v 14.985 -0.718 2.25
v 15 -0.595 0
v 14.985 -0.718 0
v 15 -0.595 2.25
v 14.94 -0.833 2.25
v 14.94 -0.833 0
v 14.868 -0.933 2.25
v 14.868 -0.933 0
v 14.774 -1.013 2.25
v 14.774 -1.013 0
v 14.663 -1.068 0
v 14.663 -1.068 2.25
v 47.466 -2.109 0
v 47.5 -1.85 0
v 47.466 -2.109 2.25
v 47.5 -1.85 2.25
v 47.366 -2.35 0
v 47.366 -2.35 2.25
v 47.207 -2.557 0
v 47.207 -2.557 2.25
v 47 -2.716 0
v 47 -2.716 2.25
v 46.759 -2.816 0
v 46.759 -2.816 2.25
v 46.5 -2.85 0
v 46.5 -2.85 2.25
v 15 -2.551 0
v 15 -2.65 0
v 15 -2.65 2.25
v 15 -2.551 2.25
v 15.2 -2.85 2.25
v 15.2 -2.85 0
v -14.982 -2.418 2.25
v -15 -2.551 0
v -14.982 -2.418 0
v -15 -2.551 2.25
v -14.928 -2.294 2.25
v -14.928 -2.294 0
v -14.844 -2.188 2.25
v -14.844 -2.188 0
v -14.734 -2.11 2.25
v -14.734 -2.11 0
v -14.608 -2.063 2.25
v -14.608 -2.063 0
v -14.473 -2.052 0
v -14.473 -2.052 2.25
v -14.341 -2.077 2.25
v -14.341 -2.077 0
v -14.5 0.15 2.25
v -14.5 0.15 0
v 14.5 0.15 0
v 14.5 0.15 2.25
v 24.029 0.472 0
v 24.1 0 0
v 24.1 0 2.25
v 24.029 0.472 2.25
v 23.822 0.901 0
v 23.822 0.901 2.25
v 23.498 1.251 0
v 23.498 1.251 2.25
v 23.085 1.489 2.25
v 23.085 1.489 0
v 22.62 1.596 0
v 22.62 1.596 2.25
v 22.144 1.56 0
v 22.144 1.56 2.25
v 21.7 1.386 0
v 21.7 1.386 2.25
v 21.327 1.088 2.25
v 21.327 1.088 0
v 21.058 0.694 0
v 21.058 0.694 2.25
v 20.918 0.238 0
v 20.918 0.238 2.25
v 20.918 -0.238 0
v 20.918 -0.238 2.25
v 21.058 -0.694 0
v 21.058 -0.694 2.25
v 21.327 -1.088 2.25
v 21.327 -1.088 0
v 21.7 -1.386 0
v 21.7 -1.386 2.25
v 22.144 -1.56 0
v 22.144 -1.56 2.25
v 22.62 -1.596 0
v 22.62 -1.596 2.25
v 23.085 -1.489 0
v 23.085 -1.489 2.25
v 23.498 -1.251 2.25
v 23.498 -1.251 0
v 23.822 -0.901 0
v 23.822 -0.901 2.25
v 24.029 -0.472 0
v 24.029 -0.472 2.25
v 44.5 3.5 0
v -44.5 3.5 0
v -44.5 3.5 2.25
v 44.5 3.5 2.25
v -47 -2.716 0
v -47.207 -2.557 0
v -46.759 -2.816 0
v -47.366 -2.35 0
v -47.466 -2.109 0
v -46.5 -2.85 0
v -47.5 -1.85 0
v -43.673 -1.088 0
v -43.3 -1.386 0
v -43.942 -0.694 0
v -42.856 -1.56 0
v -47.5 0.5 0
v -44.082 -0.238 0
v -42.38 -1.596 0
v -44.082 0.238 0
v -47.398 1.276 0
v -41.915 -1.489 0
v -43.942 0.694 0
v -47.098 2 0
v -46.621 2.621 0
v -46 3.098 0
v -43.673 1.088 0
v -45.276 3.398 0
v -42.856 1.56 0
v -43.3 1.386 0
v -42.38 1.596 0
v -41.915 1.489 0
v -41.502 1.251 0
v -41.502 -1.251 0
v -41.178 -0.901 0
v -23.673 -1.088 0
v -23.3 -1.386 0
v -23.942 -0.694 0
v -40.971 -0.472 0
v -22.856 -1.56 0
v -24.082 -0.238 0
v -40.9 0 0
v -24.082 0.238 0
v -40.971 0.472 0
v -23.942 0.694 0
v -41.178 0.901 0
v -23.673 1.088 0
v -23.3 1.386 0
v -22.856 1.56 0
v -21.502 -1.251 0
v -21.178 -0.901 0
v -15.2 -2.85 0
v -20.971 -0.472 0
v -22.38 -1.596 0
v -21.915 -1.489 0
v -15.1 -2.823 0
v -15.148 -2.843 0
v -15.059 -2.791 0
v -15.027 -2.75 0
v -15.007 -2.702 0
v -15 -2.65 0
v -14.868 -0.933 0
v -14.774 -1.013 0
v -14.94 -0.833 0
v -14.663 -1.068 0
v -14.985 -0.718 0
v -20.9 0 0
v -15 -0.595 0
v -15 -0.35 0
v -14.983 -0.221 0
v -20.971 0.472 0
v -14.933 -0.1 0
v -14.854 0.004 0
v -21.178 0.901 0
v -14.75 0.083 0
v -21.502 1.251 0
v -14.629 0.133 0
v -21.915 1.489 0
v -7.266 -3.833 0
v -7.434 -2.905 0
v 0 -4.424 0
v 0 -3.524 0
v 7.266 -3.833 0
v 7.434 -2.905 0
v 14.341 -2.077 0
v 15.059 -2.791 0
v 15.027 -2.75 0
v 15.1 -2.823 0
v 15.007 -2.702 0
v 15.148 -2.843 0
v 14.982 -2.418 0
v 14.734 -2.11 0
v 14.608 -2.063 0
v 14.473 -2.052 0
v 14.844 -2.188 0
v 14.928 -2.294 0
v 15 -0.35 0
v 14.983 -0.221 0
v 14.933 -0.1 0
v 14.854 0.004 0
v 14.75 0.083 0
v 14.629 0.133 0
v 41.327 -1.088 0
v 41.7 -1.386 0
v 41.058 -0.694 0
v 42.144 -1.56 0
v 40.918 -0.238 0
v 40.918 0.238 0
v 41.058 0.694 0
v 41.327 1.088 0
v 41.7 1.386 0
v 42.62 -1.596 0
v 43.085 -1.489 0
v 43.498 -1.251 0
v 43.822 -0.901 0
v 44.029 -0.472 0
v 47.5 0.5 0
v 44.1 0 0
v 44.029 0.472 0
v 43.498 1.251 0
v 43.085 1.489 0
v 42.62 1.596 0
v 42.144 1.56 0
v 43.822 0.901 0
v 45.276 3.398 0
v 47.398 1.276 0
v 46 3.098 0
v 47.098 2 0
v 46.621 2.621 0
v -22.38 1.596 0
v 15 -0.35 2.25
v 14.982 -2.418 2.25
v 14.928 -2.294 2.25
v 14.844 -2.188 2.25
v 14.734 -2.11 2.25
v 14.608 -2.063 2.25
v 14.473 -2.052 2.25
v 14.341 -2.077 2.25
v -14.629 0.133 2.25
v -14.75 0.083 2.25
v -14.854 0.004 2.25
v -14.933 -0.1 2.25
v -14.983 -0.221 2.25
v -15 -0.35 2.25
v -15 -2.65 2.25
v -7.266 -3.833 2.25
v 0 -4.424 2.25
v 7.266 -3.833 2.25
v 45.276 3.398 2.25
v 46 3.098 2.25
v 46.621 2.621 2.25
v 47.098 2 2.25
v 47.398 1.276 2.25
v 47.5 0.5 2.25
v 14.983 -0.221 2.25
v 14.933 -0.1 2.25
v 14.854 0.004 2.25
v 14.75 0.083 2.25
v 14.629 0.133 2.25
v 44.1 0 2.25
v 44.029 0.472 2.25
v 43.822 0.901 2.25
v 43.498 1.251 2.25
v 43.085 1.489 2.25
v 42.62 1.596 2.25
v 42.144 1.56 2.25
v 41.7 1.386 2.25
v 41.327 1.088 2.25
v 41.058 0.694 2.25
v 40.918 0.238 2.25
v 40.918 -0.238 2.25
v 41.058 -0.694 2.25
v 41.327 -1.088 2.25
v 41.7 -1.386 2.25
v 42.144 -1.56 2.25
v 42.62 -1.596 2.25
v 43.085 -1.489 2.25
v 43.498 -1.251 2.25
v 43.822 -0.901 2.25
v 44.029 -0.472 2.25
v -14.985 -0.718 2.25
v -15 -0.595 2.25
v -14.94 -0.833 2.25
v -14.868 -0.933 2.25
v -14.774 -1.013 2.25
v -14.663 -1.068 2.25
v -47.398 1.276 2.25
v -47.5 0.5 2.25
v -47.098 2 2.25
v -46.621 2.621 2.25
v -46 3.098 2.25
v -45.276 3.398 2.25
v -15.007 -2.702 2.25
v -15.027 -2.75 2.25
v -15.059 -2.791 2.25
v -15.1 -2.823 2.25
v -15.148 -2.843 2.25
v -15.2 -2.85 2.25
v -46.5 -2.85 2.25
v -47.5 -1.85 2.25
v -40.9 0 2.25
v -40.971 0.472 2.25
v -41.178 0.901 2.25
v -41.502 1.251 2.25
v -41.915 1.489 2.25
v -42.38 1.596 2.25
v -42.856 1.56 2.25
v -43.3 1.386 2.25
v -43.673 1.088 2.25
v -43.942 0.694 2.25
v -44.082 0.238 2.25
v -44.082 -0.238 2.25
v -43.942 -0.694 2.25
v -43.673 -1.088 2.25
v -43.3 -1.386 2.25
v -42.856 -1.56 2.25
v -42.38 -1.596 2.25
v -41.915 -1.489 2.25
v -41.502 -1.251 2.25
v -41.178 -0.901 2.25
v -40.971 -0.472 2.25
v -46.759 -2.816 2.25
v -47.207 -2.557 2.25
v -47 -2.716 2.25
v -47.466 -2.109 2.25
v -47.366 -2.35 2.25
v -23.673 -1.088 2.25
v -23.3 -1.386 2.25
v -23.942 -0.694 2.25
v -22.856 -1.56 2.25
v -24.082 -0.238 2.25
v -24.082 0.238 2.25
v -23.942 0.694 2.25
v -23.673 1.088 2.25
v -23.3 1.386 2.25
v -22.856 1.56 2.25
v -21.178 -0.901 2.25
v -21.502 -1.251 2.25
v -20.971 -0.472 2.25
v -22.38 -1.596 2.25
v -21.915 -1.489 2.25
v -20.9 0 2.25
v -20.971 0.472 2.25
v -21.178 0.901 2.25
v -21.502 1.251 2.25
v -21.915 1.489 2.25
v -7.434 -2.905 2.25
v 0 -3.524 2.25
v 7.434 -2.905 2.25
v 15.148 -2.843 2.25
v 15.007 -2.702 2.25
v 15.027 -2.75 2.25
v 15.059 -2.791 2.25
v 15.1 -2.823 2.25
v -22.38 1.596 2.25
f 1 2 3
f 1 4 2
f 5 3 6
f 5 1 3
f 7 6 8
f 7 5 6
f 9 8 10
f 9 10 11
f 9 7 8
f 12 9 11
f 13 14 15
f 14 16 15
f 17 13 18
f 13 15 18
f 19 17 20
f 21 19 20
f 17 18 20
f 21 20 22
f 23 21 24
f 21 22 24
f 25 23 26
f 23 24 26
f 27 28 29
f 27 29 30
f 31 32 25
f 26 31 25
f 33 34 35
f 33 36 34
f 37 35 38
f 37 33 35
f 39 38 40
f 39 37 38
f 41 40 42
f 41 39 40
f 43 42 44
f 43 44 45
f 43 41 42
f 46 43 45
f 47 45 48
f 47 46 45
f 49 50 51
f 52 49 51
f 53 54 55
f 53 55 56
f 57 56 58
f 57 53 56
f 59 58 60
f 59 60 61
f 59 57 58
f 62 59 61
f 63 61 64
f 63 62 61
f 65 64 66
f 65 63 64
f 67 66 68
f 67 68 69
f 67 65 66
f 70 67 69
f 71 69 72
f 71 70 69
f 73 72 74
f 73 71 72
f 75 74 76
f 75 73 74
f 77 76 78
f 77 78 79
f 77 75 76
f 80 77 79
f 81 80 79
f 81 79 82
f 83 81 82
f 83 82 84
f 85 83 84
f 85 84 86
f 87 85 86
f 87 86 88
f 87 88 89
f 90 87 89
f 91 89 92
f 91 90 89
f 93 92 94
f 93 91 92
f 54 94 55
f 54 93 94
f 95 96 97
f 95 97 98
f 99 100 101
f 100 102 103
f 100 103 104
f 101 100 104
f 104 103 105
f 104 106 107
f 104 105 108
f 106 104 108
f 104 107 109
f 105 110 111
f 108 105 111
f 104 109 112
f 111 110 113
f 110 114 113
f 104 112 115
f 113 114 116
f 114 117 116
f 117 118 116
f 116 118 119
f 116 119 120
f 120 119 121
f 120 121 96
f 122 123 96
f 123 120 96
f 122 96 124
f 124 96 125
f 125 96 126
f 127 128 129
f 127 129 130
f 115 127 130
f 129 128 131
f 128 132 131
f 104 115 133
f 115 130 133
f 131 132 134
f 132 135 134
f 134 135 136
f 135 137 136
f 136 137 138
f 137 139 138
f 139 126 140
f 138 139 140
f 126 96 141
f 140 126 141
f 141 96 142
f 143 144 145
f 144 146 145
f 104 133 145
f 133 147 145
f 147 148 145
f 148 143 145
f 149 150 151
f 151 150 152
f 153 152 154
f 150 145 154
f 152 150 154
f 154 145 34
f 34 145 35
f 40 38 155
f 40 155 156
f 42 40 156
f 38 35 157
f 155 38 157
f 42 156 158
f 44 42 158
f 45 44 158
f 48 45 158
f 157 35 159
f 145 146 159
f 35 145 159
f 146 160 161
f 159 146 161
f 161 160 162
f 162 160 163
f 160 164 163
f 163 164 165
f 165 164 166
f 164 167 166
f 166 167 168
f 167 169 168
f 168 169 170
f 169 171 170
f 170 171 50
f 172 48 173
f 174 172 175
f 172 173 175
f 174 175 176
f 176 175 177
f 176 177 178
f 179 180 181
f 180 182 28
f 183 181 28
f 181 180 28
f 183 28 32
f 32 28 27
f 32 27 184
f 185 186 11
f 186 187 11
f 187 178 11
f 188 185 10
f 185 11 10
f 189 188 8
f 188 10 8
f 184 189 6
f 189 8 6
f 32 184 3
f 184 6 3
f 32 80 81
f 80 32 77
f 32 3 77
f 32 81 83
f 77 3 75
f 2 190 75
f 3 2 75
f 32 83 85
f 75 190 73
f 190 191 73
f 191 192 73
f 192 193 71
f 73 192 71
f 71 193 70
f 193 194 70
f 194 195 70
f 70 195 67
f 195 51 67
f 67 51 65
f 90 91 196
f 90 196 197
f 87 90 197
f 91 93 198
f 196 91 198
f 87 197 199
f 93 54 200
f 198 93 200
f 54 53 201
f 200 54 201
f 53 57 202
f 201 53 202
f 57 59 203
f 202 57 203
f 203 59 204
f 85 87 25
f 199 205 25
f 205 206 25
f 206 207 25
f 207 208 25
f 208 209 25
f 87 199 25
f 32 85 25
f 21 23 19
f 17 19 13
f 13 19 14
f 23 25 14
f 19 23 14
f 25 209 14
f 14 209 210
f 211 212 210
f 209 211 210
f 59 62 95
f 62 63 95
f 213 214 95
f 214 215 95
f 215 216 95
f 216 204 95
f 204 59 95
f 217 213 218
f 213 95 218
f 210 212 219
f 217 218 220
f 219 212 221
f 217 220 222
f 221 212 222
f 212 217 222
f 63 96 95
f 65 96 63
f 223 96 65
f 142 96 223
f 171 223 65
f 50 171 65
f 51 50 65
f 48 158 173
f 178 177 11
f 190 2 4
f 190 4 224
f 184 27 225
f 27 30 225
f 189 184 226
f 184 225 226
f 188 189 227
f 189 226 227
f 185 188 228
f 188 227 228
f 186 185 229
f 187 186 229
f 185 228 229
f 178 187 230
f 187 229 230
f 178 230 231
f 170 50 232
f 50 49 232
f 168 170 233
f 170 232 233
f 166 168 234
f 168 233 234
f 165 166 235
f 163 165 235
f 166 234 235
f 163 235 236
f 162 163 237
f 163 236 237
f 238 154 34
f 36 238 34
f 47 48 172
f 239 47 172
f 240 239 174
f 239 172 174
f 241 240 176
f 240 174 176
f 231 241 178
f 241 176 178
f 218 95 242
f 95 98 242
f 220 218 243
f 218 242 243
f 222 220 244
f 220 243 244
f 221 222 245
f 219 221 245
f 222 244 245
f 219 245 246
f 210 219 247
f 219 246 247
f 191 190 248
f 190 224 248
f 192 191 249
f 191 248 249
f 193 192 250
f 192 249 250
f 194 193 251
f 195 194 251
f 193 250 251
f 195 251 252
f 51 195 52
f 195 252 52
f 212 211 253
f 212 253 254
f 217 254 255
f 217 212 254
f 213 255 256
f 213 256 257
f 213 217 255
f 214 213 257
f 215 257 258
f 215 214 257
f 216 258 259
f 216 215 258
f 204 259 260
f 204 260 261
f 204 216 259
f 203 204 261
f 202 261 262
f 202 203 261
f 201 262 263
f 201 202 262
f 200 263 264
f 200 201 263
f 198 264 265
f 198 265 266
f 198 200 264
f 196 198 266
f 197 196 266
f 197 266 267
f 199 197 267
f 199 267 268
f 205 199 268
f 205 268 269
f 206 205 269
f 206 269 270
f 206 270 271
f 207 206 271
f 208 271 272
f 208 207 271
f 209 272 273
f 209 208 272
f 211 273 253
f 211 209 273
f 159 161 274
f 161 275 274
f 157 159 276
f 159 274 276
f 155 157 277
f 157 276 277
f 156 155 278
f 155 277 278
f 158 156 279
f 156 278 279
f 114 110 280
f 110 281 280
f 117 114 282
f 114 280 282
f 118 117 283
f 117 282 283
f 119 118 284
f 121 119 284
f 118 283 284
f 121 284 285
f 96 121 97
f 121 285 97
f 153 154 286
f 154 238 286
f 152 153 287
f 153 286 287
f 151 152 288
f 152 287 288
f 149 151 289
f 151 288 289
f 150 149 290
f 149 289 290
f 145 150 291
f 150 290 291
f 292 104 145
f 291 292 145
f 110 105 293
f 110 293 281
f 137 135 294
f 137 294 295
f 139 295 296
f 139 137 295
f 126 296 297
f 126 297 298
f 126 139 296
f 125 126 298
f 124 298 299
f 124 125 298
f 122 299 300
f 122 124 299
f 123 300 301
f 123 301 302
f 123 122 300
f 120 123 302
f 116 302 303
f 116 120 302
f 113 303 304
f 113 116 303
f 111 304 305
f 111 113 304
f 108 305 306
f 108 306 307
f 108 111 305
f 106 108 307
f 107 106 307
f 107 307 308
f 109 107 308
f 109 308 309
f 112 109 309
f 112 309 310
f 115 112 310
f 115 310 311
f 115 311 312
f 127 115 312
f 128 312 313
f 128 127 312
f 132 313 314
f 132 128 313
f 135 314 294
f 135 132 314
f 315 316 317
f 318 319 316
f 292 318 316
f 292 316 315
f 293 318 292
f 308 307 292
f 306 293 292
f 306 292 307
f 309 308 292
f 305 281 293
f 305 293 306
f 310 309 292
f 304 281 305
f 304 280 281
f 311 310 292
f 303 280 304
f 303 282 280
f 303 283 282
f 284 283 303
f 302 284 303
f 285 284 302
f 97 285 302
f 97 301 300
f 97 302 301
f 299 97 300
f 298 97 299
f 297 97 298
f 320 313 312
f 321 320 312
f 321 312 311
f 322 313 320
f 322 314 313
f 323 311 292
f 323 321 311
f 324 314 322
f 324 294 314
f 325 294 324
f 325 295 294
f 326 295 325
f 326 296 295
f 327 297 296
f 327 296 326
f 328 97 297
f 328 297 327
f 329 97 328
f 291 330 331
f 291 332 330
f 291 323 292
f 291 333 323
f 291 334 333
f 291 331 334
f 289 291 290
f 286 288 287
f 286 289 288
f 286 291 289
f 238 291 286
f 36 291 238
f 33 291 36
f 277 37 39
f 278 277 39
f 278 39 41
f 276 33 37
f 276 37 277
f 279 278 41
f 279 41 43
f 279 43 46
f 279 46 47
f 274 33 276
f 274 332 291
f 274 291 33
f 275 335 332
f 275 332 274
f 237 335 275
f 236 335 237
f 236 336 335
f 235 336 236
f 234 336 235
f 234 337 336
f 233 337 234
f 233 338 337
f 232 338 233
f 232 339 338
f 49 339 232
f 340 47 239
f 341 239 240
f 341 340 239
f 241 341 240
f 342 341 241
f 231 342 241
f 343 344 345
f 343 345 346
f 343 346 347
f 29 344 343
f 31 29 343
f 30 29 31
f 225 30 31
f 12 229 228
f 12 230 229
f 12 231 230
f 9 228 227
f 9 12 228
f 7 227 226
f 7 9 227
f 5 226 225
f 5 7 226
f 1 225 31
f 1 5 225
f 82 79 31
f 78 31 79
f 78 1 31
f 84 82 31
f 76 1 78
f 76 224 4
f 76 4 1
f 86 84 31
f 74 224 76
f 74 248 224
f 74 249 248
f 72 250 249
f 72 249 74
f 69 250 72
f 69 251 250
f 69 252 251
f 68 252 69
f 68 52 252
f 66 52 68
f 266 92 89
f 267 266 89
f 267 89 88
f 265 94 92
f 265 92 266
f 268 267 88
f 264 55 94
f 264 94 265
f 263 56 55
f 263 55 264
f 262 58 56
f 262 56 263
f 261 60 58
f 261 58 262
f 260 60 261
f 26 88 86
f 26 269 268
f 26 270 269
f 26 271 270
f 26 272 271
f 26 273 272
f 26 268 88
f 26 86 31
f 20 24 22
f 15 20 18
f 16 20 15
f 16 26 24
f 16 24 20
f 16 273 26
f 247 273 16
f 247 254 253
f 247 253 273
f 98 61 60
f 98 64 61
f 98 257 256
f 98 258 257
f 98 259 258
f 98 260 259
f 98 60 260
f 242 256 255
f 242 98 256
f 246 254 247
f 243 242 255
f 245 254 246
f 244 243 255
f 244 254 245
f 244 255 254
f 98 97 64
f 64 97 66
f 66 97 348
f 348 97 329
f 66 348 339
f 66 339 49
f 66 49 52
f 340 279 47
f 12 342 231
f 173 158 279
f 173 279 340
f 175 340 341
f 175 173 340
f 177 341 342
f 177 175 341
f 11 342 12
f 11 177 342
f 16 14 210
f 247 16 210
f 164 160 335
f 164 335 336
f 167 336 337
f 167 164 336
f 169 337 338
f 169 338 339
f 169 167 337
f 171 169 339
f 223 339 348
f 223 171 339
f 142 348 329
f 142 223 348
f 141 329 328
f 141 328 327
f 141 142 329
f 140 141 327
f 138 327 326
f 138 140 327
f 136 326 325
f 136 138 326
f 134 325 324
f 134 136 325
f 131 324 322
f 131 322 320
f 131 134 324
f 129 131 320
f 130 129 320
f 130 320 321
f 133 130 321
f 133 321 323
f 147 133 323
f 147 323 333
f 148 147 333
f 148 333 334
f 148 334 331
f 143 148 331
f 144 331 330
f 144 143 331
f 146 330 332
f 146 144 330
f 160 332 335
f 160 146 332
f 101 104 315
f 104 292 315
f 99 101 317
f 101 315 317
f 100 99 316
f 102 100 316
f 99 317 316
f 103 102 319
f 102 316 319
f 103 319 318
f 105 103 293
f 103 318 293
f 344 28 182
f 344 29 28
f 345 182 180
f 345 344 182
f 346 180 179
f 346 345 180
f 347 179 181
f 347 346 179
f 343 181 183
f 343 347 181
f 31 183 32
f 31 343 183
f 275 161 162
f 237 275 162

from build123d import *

# Parameters (mm, degrees)
SKETCH011_W          = 95
SKETCH011_H          = 6.35
SKETCH011_R          = 1.6
PAD005_DEPTH         = 2.25
SKETCH012_W          = 30
SKETCH012_H          = 3
POCKET003_DEPTH      = 0.001
POCKET003_DEPTH_BACK = 2.251
PAD006_DEPTH         = 2.25
FILLET002_R          = 0.5
FILLET004_R          = 0.2
FILLET003_R          = 1
FILLET005_R          = 3


with BuildPart() as part:
    # Sketch011 → Pad005 (new body)
    with BuildSketch(Plane.XY):
        with Locations((0, 0.325)):
            Rectangle(SKETCH011_W, SKETCH011_H)
        with Locations((-42.5, 0)):
            Circle(SKETCH011_R, mode=Mode.SUBTRACT)
        with Locations((42.5, 0)):
            Circle(SKETCH011_R, mode=Mode.SUBTRACT)
        with Locations((-22.5, 0)):
            Circle(SKETCH011_R, mode=Mode.SUBTRACT)
        with Locations((22.5, 0)):
            Circle(SKETCH011_R, mode=Mode.SUBTRACT)
    extrude(amount=PAD005_DEPTH)

    # Sketch012 → Pocket003 (cut, two sides)
    with BuildSketch(Plane.XY) as pocket003_sk:
        with Locations((0, -1.35)):
            Rectangle(SKETCH012_W, SKETCH012_H)
    extrude(amount=-POCKET003_DEPTH, mode=Mode.SUBTRACT)
    extrude(pocket003_sk.sketch, amount=POCKET003_DEPTH_BACK, mode=Mode.SUBTRACT)

    # Sketch013 → Pad006 (join)
    with BuildSketch(Plane.XY):
        with BuildLine():
            ThreePointArc((-15, -1.85), (0, -4.423593), (15, -1.85))
            Line((15, -0.95), (15, -1.85))
            ThreePointArc((-15, -0.95), (0, -3.523593), (15, -0.95))
            Line((-15, -0.95), (-15, -1.85))
        make_face()
    extrude(amount=PAD006_DEPTH)

    # Fillet002
    fillet002_edges = [part.edges().sort_by_distance(p)[0] for p in [
        (15, 0.15, 1.125),
        (-15, 0.15, 1.125),
        (-15, -0.95, 1.125),
        (15, -0.95, 1.125),
        (-15, -1.85, 1.125),
        (15, -1.85, 1.125),
    ]]
    fillet(fillet002_edges, radius=FILLET002_R)

    # Fillet004
    fillet004_edges = [part.edges().sort_by_distance(p)[0] for p in [
        (15, -2.85, 1.125),
        (-15, -2.85, 1.125),
    ]]
    fillet(fillet004_edges, radius=FILLET004_R)

    # Fillet003
    fillet003_edges = [part.edges().sort_by_distance(p)[0] for p in [
        (-47.5, -2.85, 1.125),
        (47.5, -2.85, 1.125),
    ]]
    fillet(fillet003_edges, radius=FILLET003_R)

    # Fillet005
    fillet005_edges = [part.edges().sort_by_distance(p)[0] for p in [
        (-47.5, 3.5, 1.125),
        (47.5, 3.5, 1.125),
    ]]
    fillet(fillet005_edges, radius=FILLET005_R)


solid = part.part
